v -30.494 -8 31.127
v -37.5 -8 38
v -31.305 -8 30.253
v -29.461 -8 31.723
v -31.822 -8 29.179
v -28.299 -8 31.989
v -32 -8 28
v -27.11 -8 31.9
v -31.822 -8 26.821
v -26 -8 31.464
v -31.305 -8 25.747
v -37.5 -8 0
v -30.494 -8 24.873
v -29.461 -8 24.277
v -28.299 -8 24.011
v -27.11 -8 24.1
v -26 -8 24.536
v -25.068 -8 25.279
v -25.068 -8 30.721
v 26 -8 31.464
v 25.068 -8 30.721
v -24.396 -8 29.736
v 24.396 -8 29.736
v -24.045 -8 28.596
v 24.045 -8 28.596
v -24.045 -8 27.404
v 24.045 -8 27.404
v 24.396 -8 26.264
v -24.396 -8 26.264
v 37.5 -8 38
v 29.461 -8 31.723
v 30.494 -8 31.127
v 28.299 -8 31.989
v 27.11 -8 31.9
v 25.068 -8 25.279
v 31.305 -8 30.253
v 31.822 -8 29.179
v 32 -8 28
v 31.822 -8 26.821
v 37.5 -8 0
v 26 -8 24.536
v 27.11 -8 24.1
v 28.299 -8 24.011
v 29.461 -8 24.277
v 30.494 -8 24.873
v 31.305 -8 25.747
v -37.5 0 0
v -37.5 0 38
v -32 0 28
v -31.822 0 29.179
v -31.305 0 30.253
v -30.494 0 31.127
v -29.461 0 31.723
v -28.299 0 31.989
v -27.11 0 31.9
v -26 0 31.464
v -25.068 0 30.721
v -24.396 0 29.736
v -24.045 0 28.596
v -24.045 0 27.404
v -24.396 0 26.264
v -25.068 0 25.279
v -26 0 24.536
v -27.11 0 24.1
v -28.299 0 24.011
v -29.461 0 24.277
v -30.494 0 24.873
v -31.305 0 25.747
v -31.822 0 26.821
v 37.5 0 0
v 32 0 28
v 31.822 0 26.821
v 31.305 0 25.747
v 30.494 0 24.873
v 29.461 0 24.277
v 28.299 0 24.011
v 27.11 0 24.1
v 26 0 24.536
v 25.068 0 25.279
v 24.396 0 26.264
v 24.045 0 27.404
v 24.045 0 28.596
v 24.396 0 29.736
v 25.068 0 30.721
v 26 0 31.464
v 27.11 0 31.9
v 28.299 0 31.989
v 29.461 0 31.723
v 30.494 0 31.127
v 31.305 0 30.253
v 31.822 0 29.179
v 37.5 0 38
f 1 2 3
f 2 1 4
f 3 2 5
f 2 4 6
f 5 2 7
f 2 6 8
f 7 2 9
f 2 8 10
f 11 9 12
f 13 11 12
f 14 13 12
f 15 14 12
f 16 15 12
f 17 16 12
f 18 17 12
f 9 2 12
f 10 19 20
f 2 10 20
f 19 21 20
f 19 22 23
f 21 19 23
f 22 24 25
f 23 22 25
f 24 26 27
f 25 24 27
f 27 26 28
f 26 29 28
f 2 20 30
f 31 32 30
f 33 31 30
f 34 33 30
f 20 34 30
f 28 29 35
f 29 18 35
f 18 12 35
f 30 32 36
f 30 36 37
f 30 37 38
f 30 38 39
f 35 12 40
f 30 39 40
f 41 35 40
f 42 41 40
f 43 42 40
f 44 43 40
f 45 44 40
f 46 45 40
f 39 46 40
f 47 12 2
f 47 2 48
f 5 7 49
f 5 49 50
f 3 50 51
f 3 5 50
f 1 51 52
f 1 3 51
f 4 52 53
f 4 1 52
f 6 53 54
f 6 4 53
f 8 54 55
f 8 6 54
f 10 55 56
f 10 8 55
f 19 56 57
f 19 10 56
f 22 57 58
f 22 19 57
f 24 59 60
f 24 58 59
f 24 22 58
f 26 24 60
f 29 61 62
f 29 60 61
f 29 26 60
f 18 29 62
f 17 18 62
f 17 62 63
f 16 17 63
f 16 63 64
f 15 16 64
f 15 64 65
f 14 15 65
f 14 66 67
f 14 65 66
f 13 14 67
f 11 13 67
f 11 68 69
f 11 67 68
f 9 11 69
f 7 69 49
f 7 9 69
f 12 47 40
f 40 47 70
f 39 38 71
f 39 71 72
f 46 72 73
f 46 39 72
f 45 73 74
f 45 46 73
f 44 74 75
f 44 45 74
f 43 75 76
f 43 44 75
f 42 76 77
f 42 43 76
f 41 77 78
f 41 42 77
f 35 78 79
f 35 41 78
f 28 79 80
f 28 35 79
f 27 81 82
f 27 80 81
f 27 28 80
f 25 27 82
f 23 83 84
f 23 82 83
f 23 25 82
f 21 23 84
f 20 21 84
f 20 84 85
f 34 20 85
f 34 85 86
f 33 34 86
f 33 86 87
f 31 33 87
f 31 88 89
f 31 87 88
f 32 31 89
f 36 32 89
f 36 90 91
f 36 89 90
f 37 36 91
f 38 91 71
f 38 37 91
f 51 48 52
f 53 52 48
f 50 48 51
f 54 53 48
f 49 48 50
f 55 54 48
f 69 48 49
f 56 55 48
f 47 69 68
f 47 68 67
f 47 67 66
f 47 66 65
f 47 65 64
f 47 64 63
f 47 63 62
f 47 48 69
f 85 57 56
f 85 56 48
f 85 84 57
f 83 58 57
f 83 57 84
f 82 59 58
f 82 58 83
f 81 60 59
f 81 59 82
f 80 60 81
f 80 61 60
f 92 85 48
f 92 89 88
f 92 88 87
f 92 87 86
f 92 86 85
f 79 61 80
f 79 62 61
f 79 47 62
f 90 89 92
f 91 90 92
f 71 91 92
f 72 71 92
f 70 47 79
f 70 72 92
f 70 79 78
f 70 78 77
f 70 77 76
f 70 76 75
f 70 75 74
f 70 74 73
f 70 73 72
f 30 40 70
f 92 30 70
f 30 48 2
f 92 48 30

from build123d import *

# Parameters (mm, degrees)
SKETCH1_W               = 75
SKETCH1_H               = 8
BOSS_EXTRUDE1_DEPTH     = 38
CUT_EXTRUDE1_DEPTH      = 54.983793864
CUT_EXTRUDE1_DEPTH_BACK = 54.983793864
SKETCH2_R               = 4


with BuildPart() as part:
    # Sketch1 → Boss-Extrude1 (new body)
    with BuildSketch(Plane.XY):
        with Locations((0, -4)):
            Rectangle(SKETCH1_W, SKETCH1_H)
    extrude(amount=BOSS_EXTRUDE1_DEPTH)

    # Sketch2 → Cut-Extrude1 (cut, two sides: drawn at the far end of the back side and taken through both)
    with BuildSketch(Plane(origin=(0, 0, 0), x_dir=(1, 0, 0), z_dir=(0, 1, 0)).offset(-CUT_EXTRUDE1_DEPTH_BACK)):
        with Locations(Location((-28, -28, 0), (0, 0, 180))):
            Circle(SKETCH2_R)
        with Locations((28, -28)):
            Circle(SKETCH2_R)
    extrude(amount=CUT_EXTRUDE1_DEPTH + CUT_EXTRUDE1_DEPTH_BACK, mode=Mode.SUBTRACT)


solid = part.part
